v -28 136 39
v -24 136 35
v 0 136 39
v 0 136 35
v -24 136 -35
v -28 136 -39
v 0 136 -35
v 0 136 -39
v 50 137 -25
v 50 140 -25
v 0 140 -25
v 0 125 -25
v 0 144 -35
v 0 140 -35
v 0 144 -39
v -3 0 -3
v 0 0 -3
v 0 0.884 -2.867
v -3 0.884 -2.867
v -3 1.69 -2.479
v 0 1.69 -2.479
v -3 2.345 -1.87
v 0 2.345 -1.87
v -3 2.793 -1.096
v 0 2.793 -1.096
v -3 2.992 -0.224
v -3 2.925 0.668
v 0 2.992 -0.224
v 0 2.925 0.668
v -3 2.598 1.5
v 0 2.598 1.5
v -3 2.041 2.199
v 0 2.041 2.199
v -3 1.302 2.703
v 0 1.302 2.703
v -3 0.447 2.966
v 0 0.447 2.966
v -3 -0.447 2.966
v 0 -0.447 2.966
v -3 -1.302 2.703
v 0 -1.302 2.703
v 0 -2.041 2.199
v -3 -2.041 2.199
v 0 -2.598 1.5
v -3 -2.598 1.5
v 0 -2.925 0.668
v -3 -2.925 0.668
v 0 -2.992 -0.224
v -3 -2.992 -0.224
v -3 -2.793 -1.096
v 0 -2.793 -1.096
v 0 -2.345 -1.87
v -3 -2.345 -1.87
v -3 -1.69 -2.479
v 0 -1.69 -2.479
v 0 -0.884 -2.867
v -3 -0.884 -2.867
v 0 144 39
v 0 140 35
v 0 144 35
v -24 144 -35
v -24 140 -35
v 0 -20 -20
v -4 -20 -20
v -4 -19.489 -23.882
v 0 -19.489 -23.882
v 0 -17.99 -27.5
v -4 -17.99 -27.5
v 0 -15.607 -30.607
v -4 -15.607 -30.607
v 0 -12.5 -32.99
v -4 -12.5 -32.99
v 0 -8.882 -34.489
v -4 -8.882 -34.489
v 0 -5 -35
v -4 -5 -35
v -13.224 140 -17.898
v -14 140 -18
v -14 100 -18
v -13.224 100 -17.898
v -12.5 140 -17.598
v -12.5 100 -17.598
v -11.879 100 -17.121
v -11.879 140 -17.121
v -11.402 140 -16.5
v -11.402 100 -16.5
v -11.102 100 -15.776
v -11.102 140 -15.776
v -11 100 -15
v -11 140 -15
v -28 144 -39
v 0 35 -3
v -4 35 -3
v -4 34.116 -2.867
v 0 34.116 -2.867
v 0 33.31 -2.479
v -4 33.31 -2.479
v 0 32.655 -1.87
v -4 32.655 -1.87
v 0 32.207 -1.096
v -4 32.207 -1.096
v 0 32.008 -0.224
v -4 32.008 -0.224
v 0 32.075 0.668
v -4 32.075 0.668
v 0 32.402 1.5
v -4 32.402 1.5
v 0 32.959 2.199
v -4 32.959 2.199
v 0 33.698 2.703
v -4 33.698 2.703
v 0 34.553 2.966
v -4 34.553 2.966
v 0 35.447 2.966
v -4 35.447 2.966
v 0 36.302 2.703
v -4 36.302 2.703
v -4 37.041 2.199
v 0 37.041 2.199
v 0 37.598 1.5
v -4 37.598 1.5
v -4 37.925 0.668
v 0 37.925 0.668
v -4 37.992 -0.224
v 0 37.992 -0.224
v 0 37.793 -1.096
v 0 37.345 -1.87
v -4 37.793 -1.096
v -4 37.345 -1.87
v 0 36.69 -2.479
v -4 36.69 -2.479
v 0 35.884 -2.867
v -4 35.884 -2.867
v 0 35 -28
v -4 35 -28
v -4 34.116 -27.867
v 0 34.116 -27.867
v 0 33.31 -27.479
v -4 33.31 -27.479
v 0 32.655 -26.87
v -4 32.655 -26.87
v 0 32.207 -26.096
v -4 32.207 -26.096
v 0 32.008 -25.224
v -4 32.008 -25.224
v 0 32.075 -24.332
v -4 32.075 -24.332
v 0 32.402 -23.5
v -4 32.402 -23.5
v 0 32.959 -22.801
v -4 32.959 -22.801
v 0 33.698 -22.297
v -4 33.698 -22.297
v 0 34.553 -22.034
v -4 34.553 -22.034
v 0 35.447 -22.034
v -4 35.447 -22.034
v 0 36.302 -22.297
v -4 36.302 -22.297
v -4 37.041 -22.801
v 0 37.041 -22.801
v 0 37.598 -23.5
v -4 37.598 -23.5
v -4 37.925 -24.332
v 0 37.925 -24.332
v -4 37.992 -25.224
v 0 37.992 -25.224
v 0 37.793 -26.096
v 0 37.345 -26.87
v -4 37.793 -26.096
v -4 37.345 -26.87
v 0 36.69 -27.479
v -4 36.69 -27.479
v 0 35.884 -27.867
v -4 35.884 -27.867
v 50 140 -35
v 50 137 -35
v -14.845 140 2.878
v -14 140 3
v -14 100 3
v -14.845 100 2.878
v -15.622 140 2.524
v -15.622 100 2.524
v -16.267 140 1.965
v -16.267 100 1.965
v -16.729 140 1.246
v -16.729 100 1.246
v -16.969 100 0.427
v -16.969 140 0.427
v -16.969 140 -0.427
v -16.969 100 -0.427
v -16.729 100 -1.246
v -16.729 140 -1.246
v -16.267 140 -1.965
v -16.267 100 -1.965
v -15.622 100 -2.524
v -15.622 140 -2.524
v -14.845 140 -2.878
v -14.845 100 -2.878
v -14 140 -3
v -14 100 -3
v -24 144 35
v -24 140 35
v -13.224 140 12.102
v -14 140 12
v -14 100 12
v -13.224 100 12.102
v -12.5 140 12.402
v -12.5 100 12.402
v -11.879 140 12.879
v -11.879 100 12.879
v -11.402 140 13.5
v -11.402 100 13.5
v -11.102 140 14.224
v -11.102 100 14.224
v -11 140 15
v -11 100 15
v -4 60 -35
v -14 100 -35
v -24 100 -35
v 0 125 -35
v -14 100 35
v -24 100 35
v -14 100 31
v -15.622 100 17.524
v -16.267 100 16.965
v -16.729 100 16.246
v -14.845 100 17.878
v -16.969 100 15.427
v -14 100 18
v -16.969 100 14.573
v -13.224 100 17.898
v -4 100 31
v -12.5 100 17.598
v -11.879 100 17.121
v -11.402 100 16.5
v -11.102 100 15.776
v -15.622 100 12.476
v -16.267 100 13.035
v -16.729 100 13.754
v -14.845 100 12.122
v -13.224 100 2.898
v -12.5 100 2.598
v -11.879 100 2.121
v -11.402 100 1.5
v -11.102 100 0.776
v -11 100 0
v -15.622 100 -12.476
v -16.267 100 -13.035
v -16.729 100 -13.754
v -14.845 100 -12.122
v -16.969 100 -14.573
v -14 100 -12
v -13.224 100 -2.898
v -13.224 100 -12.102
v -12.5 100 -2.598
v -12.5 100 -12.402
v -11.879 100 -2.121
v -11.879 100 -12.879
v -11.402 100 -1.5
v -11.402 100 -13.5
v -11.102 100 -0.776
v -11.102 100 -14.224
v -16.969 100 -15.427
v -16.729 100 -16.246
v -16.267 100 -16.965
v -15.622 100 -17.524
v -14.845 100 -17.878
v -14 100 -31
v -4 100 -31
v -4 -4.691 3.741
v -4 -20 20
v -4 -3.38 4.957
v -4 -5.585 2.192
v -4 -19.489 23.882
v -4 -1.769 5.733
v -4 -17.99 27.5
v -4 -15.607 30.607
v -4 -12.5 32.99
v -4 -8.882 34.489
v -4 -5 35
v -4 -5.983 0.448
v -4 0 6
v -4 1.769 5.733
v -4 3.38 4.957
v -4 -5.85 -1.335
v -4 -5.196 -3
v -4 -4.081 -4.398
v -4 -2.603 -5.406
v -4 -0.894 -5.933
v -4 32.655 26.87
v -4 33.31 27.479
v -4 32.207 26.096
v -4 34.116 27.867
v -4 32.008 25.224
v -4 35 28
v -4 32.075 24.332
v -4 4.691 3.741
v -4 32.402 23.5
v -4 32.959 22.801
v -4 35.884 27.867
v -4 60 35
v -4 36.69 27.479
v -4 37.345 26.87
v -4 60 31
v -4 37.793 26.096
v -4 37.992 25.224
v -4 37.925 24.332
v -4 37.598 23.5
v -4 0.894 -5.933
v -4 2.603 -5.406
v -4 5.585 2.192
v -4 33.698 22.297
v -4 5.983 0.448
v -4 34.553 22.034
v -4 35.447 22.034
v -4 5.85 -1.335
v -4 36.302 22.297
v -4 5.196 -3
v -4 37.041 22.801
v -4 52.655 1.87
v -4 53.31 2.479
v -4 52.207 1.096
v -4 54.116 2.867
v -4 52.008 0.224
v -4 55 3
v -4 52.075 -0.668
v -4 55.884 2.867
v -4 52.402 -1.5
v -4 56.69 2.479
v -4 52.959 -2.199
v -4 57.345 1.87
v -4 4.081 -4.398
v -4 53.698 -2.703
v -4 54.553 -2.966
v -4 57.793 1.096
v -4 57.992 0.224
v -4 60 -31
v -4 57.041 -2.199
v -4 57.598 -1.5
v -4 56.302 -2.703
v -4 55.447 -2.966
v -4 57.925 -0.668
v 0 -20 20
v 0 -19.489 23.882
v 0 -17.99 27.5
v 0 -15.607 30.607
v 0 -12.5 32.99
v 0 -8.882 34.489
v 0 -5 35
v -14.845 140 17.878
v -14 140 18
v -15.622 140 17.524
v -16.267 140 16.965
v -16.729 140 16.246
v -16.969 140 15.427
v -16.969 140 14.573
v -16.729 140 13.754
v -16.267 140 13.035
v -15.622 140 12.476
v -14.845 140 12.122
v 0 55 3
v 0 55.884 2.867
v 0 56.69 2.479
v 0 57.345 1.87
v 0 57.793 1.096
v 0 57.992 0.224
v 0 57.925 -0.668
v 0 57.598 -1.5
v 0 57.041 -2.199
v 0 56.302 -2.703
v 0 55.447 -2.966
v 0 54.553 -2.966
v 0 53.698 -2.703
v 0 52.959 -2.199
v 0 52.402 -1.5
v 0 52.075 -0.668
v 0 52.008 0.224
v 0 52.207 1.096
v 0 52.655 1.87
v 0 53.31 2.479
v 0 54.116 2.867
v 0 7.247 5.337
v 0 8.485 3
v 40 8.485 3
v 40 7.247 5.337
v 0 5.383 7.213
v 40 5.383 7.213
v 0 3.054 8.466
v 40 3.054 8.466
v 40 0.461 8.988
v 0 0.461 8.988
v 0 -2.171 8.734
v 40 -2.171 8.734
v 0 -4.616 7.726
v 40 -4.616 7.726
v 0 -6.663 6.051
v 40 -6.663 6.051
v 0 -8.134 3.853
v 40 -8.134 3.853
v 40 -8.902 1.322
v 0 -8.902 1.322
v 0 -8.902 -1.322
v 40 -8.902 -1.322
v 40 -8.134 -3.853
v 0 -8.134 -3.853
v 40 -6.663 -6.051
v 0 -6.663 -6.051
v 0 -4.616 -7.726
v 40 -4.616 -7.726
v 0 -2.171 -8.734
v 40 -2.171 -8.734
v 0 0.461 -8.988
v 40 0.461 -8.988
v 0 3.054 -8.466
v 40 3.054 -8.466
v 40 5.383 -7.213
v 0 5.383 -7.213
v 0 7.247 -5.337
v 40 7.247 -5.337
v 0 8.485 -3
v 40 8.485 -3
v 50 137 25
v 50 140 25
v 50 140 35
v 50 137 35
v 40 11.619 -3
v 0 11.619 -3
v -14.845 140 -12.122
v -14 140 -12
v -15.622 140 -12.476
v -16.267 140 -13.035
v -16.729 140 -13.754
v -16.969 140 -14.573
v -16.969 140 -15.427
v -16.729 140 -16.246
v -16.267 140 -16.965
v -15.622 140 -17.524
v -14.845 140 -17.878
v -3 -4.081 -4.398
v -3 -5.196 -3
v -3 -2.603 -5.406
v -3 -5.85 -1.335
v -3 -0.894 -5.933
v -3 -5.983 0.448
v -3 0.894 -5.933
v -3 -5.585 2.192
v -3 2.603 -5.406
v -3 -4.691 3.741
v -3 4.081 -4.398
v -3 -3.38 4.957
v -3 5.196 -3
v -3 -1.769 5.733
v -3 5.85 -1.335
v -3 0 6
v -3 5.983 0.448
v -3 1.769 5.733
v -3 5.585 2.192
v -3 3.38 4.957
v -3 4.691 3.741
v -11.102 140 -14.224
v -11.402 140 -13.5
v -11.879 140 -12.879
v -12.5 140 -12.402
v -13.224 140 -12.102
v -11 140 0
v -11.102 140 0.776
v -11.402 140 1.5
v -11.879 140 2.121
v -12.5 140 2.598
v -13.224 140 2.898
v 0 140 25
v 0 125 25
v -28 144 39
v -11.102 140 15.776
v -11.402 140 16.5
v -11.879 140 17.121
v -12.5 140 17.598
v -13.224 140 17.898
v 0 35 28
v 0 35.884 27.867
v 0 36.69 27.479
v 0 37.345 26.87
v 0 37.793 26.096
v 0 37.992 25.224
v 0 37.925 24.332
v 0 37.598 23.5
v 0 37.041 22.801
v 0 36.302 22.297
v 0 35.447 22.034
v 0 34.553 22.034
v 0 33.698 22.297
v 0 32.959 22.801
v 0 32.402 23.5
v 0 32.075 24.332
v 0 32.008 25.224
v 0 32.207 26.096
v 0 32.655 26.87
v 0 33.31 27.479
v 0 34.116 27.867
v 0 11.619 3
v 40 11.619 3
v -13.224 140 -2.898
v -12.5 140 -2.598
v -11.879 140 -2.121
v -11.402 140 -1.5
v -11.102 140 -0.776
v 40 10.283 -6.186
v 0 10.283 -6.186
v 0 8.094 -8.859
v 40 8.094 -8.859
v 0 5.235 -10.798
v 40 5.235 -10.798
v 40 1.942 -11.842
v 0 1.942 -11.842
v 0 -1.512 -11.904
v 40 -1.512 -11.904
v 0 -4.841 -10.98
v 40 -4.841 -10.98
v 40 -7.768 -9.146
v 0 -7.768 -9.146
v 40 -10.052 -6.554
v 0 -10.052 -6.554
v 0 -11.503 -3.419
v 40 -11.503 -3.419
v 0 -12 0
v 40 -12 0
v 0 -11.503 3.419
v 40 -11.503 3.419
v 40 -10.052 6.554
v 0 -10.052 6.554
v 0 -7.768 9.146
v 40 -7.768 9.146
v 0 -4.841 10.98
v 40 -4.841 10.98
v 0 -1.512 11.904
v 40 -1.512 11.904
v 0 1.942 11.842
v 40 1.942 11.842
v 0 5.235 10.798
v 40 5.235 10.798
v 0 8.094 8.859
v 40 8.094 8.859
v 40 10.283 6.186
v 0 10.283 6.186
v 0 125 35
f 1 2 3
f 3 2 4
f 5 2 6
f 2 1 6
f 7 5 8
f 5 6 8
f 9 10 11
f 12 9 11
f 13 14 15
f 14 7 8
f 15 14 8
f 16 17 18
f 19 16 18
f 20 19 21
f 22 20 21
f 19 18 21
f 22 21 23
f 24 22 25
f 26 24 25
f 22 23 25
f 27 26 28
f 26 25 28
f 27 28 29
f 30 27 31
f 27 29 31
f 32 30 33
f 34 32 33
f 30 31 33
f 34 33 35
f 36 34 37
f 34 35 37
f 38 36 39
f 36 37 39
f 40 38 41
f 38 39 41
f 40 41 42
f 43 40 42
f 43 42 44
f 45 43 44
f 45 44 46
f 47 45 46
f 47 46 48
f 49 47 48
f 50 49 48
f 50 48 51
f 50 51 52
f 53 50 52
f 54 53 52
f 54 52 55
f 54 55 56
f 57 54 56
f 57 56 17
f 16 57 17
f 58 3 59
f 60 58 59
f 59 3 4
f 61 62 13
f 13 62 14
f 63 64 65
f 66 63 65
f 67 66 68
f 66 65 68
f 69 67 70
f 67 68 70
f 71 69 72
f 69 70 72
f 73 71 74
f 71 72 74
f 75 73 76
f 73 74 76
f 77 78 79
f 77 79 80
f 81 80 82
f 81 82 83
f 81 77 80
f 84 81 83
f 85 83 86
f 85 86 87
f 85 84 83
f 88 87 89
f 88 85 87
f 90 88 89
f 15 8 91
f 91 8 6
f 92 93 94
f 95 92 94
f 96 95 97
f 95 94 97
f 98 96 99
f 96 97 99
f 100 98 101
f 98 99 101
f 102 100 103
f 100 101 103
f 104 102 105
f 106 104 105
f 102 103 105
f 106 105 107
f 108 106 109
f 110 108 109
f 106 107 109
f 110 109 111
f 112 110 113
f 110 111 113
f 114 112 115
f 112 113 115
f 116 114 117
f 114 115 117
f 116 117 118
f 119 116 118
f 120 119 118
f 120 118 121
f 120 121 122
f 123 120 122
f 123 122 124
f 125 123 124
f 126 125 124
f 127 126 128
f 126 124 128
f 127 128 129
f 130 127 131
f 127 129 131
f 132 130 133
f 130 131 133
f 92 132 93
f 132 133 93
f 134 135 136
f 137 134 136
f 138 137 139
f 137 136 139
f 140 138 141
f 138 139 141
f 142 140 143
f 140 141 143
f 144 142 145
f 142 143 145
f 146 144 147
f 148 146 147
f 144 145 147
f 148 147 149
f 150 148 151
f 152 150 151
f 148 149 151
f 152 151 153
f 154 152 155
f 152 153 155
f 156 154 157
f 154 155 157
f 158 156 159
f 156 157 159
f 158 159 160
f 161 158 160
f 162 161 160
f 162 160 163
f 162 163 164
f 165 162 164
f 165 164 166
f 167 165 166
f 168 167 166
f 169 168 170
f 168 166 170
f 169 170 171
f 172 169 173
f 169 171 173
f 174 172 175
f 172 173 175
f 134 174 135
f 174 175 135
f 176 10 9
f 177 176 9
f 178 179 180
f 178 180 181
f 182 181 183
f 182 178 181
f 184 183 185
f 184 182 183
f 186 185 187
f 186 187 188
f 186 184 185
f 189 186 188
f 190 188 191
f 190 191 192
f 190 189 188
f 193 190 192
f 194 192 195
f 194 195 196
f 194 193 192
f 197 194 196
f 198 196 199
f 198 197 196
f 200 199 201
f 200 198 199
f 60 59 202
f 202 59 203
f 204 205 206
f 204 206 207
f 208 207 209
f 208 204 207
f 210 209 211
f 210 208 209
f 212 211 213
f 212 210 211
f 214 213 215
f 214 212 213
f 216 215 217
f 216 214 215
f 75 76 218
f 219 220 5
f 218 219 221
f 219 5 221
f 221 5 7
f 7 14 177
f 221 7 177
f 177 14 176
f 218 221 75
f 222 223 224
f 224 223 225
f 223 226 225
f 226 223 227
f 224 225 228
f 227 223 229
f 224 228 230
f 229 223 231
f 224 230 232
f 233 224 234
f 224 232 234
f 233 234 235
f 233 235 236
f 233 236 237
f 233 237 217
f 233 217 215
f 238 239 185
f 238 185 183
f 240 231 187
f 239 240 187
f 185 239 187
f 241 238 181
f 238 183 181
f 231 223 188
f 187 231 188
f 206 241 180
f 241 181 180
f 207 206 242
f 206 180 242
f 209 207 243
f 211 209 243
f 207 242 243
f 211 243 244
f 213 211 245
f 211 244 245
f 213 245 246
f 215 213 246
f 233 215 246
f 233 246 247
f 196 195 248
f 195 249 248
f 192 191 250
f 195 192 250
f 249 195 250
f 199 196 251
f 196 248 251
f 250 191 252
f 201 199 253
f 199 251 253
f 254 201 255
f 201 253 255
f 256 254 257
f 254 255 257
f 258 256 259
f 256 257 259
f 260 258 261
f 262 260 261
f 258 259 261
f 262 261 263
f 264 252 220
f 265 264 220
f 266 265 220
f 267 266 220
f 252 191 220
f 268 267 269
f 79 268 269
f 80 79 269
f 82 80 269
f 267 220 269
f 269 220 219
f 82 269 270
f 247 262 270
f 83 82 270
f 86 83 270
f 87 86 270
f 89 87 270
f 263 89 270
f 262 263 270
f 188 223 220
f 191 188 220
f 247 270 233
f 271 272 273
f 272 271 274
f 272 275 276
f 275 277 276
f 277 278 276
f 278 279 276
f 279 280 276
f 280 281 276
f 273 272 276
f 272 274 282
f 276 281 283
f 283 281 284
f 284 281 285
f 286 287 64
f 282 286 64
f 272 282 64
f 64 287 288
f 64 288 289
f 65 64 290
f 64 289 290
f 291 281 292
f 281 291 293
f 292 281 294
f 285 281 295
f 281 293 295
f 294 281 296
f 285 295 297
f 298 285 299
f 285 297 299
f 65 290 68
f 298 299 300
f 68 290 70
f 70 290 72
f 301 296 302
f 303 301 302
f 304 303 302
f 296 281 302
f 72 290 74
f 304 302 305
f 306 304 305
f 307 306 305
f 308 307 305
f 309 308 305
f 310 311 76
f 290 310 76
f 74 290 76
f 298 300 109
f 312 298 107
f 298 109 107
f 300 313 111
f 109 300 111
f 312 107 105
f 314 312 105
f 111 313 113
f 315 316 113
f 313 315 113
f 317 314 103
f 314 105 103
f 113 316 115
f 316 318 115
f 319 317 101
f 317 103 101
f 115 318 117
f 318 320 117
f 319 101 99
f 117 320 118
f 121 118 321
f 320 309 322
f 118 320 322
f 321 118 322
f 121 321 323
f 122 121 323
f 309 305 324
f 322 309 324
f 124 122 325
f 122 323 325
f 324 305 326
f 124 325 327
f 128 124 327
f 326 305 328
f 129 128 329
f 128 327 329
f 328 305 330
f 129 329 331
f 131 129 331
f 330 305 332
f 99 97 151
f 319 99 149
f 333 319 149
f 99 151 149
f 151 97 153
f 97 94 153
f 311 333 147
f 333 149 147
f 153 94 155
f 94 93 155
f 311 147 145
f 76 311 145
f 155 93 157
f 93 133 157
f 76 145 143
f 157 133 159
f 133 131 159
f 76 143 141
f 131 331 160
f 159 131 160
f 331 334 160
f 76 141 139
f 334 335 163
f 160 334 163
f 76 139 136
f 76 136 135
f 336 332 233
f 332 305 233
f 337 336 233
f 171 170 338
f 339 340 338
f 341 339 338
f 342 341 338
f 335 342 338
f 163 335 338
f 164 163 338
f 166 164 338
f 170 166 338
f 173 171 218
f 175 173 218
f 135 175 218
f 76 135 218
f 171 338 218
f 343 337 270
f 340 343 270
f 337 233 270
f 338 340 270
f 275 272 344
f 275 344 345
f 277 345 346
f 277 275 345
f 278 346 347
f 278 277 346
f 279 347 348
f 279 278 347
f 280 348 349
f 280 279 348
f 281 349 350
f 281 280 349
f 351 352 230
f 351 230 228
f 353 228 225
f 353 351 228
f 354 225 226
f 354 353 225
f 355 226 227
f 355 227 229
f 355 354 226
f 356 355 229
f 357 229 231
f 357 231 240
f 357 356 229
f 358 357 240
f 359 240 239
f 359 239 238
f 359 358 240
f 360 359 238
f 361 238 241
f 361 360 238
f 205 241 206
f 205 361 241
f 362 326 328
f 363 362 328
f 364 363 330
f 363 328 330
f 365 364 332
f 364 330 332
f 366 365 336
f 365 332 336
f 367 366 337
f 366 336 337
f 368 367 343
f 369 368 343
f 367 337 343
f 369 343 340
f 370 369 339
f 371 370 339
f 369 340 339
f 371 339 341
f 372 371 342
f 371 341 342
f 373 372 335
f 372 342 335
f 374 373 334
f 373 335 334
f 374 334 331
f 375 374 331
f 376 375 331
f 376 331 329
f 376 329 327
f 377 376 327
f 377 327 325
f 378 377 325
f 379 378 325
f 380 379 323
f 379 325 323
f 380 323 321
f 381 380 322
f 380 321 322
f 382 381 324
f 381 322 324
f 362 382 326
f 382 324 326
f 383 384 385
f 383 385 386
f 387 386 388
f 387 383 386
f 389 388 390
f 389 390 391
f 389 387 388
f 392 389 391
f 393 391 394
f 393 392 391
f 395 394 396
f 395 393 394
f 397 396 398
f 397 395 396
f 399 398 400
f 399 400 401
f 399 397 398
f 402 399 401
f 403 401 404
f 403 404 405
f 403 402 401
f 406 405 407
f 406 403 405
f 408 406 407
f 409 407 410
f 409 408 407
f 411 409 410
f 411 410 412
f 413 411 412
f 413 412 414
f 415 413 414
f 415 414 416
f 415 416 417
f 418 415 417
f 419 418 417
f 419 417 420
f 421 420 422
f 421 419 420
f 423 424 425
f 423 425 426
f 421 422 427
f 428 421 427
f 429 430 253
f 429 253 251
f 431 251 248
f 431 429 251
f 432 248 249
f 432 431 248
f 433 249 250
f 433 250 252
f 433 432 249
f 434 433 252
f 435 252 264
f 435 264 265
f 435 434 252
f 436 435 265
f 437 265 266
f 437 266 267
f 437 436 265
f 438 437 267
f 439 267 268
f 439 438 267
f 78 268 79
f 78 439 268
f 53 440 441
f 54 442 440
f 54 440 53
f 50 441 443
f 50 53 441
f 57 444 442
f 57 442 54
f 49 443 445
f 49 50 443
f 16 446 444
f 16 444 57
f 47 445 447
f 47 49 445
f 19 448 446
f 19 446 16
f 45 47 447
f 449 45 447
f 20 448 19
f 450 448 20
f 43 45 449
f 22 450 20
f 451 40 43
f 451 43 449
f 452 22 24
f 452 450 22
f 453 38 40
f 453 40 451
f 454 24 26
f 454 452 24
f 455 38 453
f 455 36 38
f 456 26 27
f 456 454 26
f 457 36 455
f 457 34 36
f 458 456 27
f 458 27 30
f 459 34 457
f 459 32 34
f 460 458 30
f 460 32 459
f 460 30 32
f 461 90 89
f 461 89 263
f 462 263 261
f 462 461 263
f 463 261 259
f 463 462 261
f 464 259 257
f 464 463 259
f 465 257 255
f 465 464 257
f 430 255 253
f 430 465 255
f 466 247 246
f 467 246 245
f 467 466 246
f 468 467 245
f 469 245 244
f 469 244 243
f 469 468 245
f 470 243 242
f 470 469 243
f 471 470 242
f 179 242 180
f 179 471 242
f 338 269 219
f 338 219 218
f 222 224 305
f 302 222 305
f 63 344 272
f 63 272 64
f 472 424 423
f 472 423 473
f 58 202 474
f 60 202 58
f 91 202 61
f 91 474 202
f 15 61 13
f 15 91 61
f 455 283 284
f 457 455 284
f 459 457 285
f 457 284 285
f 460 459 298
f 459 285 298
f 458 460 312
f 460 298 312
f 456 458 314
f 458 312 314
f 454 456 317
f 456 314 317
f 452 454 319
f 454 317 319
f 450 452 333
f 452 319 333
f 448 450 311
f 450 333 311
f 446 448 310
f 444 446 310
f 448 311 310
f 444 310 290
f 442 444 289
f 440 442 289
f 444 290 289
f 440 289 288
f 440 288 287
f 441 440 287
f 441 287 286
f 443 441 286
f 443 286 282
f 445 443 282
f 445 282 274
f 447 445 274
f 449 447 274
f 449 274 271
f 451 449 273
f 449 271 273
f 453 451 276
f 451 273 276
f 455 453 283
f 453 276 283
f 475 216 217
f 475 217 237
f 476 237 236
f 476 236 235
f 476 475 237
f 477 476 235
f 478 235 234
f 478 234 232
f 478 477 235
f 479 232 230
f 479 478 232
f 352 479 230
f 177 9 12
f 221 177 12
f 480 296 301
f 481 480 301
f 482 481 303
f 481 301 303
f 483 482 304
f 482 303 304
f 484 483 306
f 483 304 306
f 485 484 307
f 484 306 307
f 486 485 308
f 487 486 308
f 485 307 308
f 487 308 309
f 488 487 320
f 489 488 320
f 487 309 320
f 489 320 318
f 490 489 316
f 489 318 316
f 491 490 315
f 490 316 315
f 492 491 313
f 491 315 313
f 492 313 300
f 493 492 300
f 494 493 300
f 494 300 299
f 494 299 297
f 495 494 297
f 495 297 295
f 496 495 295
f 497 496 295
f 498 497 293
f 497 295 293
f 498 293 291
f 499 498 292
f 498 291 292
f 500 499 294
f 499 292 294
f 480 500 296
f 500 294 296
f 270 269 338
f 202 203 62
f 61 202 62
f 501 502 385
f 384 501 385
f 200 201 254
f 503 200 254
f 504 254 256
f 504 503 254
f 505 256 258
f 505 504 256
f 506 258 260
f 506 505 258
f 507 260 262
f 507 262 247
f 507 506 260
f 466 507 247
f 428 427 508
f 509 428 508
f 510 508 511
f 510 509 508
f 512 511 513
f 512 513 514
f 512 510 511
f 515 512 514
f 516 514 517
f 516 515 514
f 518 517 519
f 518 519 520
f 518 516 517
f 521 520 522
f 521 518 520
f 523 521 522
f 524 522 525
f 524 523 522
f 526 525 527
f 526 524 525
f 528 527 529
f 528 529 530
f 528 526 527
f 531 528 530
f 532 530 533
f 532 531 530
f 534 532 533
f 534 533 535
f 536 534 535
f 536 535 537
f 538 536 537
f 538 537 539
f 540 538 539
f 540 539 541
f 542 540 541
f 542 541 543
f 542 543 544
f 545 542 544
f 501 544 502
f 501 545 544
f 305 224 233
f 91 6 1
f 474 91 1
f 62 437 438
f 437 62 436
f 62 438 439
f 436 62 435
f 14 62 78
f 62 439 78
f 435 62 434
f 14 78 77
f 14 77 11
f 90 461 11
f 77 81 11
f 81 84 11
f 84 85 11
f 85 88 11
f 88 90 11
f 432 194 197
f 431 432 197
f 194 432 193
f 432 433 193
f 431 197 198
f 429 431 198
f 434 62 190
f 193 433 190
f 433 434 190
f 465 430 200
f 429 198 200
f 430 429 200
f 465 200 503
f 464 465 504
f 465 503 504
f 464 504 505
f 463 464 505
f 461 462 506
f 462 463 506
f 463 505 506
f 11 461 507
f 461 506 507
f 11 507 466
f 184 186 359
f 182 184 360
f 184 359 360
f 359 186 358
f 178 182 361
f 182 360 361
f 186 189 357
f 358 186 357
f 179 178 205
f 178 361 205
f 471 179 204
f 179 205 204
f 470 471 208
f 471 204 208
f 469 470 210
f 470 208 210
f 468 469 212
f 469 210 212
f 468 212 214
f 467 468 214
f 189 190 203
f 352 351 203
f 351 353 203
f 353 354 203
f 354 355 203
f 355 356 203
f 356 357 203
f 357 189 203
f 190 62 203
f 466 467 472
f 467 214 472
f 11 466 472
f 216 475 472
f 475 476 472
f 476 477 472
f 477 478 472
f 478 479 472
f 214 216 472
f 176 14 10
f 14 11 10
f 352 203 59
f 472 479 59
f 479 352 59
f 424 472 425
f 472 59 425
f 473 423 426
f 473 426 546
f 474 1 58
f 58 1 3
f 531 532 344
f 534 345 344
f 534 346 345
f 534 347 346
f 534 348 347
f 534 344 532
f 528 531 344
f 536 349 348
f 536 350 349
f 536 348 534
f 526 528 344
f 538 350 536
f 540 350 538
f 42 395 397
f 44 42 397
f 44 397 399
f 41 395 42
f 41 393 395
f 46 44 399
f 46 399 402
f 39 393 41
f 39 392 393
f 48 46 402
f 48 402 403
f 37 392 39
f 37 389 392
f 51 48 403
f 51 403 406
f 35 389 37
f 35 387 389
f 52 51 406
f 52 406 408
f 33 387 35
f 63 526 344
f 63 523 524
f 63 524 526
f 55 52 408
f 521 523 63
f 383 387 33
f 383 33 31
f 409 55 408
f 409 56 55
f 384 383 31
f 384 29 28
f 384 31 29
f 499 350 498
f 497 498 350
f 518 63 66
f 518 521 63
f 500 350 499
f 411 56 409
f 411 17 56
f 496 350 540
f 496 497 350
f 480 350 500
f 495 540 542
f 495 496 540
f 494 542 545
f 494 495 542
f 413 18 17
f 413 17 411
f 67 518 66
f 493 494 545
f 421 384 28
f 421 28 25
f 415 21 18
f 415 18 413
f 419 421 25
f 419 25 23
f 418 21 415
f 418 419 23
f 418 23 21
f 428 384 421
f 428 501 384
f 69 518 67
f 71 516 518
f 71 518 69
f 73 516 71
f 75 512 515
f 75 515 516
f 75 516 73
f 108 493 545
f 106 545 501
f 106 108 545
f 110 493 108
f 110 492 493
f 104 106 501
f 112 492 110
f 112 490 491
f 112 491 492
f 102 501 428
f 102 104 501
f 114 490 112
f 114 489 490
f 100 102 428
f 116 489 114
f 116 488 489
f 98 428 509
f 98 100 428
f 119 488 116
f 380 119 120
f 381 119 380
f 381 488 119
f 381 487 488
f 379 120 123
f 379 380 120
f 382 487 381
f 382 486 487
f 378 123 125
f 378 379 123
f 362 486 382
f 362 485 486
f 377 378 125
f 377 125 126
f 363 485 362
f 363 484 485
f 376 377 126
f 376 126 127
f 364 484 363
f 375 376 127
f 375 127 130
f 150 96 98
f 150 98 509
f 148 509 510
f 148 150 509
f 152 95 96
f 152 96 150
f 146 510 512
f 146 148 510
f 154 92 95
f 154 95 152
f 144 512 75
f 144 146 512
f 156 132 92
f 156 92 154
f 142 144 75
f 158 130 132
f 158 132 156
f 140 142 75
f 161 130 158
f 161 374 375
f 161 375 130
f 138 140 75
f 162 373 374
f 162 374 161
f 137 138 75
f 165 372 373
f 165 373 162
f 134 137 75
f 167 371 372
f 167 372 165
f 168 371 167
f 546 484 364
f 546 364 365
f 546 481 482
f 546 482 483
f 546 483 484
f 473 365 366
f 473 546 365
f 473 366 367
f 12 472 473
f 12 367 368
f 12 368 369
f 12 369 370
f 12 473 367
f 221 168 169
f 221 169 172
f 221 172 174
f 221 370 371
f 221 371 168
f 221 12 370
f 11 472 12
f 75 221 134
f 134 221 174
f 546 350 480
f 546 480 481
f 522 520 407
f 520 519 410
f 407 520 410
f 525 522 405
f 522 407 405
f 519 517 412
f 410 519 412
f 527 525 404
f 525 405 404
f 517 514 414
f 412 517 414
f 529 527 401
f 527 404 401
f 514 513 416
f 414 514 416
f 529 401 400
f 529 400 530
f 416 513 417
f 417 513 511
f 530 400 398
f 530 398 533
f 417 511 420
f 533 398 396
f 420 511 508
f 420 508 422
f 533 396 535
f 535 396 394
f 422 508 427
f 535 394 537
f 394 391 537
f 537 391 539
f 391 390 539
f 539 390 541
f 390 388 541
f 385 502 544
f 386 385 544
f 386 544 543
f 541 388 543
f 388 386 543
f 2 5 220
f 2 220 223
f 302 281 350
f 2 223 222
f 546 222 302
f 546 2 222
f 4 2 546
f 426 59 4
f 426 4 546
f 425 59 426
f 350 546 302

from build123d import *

# Parameters (mm, degrees)
SALIENTE_EXTRUIR1_DEPTH      = 40
SALIENTE_EXTRUIR2_DEPTH      = 4
CROQUIS3_R                   = 3
CORTAR_EXTRUIR1_DEPTH        = 4
CROQUIS4_R                   = 6
CORTAR_EXTRUIR2_DEPTH        = 1
SALIENTE_EXTRUIR3_DEPTH      = 40
SALIENTE_EXTRUIR4_START      = 25
SALIENTE_EXTRUIR4_DEPTH      = 10
SALIENTE_EXTRUIR5_START      = -25
SALIENTE_EXTRUIR5_DEPTH      = 10
SALIENTE_EXTRUIR6_DEPTH      = 4
SALIENTE_EXTRUIR6_DEPTH_BACK = 4
SALIENTE_EXTRUIR6_START      = 140
SALIENTE_EXTRUIR7_START      = 31
SALIENTE_EXTRUIR7_DEPTH      = 4
SALIENTE_EXTRUIR8_START      = -31
SALIENTE_EXTRUIR8_DEPTH      = 4
CORTAR_EXTRUIR3_DEPTH        = 4
CORTAR_EXTRUIR4_DEPTH        = 4
CROQUIS22_R                  = 3
CORTAR_EXTRUIR5_DEPTH        = 4


with BuildPart() as part:
    # Croquis1 → Saliente-Extruir1 (new body)
    with BuildSketch(Plane(origin=(0, 0, 0), x_dir=(0, 0, -1), z_dir=(1, 0, 0))):
        with BuildLine():
            Line((3, 9), (3, 11.618950039))
            ThreePointArc((3, 11.618950039), (0, -12), (-3, 11.618950039))
            Line((-3, 11.618950039), (-3, 9))
            Line((-3, 9), (-3, 8.485281374))
            ThreePointArc((-3, 8.485281374), (0, -9), (3, 8.485281374))
            Line((3, 8.485281374), (3, 9))
        make_face()
    extrude(amount=SALIENTE_EXTRUIR1_DEPTH)

    # Croquis2 → Saliente-Extruir2 (add)
    with BuildSketch(Plane.ZY):
        Polygon((-35, 0), (-35, 140), (35, 140), (35, 0), (35, -20), (-35, -20), align=None)
    extrude(amount=SALIENTE_EXTRUIR2_DEPTH)

    # Croquis3 → Cortar-Extruir1 (cut)
    with BuildSketch(Plane(origin=(0, 0, 0), x_dir=(0, 0, -1), z_dir=(1, 0, 0))):
        Circle(CROQUIS3_R)
    extrude(amount=-CORTAR_EXTRUIR1_DEPTH, mode=Mode.SUBTRACT)

    # Croquis4 → Cortar-Extruir2 (cut)
    with BuildSketch(Plane.ZY.offset(4)):
        Circle(CROQUIS4_R)
    extrude(amount=-CORTAR_EXTRUIR2_DEPTH, mode=Mode.SUBTRACT)

    # Croquis6 → Saliente-Extruir3 (add)
    with BuildSketch(Plane(origin=(0, 140, 0), x_dir=(1, 0, 0), z_dir=(0, 1, 0))):
        with BuildLine():
            Line((-14, 30), (-14, 35))
            Line((-14, 35), (-24, 35))
            Line((-24, 35), (-24, -35))
            Line((-24, -35), (-14, -35))
            Line((-14, -35), (-14, -30))
            Line((-14, -30), (-14, -18))
            ThreePointArc((-14, -18), (-17, -15), (-14, -12))
            Line((-14, -12), (-14, -3))
            ThreePointArc((-14, -3), (-17, 0), (-14, 3))
            Line((-14, 3), (-14, 12))
            ThreePointArc((-14, 12), (-17, 15), (-14, 18))
            Line((-14, 18), (-14, 30))
        make_face()
        with BuildLine():
            Line((-4, 35), (-14, 35))
            Line((-14, 35), (-14, 30))
            Line((-14, 30), (-14, 18))
            ThreePointArc((-14, 18), (-11.878679656, 17.121320344), (-11, 15))
            ThreePointArc((-11, 15), (-11.878679656, 12.878679656), (-14, 12))
            Line((-14, 12), (-14, 3))
            ThreePointArc((-14, 3), (-11.878679656, 2.121320344), (-11, 0))
            ThreePointArc((-11, 0), (-11.878679656, -2.121320344), (-14, -3))
            Line((-14, -3), (-14, -12))
            ThreePointArc((-14, -12), (-11.878679656, -12.878679656), (-11, -15))
            ThreePointArc((-11, -15), (-11.878679656, -17.121320344), (-14, -18))
            Line((-14, -18), (-14, -30))
            Line((-14, -30), (-14, -35))
            Line((-14, -35), (-4, -35))
            Line((-4, -35), (-4, 35))
        make_face()
    extrude(amount=-SALIENTE_EXTRUIR3_DEPTH)

    # Croquis7 → Saliente-Extruir4 (add)
    with BuildSketch(Plane.XY.offset(SALIENTE_EXTRUIR4_START)):
        Polygon((0, 140), (50, 140), (50, 137), (0, 125), align=None)
    extrude(amount=SALIENTE_EXTRUIR4_DEPTH)

    # Croquis8 → Saliente-Extruir5 (add)
    with BuildSketch(Plane.XY.offset(SALIENTE_EXTRUIR5_START)):
        Polygon((0, 140), (50, 140), (50, 137), (0, 125), align=None)
    extrude(amount=-SALIENTE_EXTRUIR5_DEPTH)

    # Croquis9 → Saliente-Extruir6 (add, two sides: drawn at the far end of the back side and taken through both)
    with BuildSketch(Plane(origin=(0, 0, 0), x_dir=(1, 0, 0), z_dir=(0, 1, 0)).offset(SALIENTE_EXTRUIR6_START - SALIENTE_EXTRUIR6_DEPTH_BACK)):
        Polygon((0, 35), (0, 39), (-28, 39), (-28, -39), (-24, -39), (0, -39), (0, -35), (-24, -35), (-24, 35), align=None)
    extrude(amount=SALIENTE_EXTRUIR6_DEPTH + SALIENTE_EXTRUIR6_DEPTH_BACK)

    # Croquis16 → Saliente-Extruir7 (add)
    with BuildSketch(Plane.XY.offset(SALIENTE_EXTRUIR7_START)):
        Polygon((-14, 100), (-4, 60), (-4, 100), align=None)
    extrude(amount=SALIENTE_EXTRUIR7_DEPTH)

    # Croquis17 → Saliente-Extruir8 (add)
    with BuildSketch(Plane.XY.offset(SALIENTE_EXTRUIR8_START)):
        Polygon((-4, 100), (-14, 100), (-4, 60), align=None)
    extrude(amount=-SALIENTE_EXTRUIR8_DEPTH)

    # Croquis19 → Cortar-Extruir3 (cut)
    with BuildSketch(Plane.ZY.offset(4)):
        with BuildLine():
            Line((-35, -20), (-20, -20))
            ThreePointArc((-20, -20), (-30.606601718, -15.606601718), (-35, -5))
            Line((-35, -5), (-35, -20))
        make_face()
        with BuildLine():
            Line((35, -20), (20, -20))
            ThreePointArc((20, -20), (30.606601718, -15.606601718), (35, -5))
            Line((35, -5), (35, -20))
        make_face()
    extrude(amount=-CORTAR_EXTRUIR3_DEPTH, mode=Mode.SUBTRACT)

    # Croquis20 → Cortar-Extruir4 (cut)
    with BuildSketch(Plane.ZY.offset(4)):
        with BuildLine():
            ThreePointArc((-22, 35), (-25, 38), (-28, 35))
            Line((-28, 35), (-22, 35))
        make_face()
        with BuildLine():
            Line((-22, 35), (-28, 35))
            ThreePointArc((-28, 35), (-25, 32), (-22, 35))
        make_face()
        with BuildLine():
            ThreePointArc((3, 35), (0, 38), (-3, 35))
            Line((-3, 35), (3, 35))
        make_face()
        with BuildLine():
            Line((3, 35), (-3, 35))
            ThreePointArc((-3, 35), (0, 32), (3, 35))
        make_face()
        with BuildLine():
            ThreePointArc((22, 35), (25, 32), (28, 35))
            Line((28, 35), (22, 35))
        make_face()
        with BuildLine():
            Line((22, 35), (28, 35))
            ThreePointArc((28, 35), (25, 38), (22, 35))
        make_face()
    extrude(amount=-CORTAR_EXTRUIR4_DEPTH, mode=Mode.SUBTRACT)

    # Croquis22 → Cortar-Extruir5 (cut)
    with BuildSketch(Plane.ZY.offset(4)):
        with Locations((0, 55)):
            Circle(CROQUIS22_R)
    extrude(amount=-CORTAR_EXTRUIR5_DEPTH, mode=Mode.SUBTRACT)


solid = part.part
